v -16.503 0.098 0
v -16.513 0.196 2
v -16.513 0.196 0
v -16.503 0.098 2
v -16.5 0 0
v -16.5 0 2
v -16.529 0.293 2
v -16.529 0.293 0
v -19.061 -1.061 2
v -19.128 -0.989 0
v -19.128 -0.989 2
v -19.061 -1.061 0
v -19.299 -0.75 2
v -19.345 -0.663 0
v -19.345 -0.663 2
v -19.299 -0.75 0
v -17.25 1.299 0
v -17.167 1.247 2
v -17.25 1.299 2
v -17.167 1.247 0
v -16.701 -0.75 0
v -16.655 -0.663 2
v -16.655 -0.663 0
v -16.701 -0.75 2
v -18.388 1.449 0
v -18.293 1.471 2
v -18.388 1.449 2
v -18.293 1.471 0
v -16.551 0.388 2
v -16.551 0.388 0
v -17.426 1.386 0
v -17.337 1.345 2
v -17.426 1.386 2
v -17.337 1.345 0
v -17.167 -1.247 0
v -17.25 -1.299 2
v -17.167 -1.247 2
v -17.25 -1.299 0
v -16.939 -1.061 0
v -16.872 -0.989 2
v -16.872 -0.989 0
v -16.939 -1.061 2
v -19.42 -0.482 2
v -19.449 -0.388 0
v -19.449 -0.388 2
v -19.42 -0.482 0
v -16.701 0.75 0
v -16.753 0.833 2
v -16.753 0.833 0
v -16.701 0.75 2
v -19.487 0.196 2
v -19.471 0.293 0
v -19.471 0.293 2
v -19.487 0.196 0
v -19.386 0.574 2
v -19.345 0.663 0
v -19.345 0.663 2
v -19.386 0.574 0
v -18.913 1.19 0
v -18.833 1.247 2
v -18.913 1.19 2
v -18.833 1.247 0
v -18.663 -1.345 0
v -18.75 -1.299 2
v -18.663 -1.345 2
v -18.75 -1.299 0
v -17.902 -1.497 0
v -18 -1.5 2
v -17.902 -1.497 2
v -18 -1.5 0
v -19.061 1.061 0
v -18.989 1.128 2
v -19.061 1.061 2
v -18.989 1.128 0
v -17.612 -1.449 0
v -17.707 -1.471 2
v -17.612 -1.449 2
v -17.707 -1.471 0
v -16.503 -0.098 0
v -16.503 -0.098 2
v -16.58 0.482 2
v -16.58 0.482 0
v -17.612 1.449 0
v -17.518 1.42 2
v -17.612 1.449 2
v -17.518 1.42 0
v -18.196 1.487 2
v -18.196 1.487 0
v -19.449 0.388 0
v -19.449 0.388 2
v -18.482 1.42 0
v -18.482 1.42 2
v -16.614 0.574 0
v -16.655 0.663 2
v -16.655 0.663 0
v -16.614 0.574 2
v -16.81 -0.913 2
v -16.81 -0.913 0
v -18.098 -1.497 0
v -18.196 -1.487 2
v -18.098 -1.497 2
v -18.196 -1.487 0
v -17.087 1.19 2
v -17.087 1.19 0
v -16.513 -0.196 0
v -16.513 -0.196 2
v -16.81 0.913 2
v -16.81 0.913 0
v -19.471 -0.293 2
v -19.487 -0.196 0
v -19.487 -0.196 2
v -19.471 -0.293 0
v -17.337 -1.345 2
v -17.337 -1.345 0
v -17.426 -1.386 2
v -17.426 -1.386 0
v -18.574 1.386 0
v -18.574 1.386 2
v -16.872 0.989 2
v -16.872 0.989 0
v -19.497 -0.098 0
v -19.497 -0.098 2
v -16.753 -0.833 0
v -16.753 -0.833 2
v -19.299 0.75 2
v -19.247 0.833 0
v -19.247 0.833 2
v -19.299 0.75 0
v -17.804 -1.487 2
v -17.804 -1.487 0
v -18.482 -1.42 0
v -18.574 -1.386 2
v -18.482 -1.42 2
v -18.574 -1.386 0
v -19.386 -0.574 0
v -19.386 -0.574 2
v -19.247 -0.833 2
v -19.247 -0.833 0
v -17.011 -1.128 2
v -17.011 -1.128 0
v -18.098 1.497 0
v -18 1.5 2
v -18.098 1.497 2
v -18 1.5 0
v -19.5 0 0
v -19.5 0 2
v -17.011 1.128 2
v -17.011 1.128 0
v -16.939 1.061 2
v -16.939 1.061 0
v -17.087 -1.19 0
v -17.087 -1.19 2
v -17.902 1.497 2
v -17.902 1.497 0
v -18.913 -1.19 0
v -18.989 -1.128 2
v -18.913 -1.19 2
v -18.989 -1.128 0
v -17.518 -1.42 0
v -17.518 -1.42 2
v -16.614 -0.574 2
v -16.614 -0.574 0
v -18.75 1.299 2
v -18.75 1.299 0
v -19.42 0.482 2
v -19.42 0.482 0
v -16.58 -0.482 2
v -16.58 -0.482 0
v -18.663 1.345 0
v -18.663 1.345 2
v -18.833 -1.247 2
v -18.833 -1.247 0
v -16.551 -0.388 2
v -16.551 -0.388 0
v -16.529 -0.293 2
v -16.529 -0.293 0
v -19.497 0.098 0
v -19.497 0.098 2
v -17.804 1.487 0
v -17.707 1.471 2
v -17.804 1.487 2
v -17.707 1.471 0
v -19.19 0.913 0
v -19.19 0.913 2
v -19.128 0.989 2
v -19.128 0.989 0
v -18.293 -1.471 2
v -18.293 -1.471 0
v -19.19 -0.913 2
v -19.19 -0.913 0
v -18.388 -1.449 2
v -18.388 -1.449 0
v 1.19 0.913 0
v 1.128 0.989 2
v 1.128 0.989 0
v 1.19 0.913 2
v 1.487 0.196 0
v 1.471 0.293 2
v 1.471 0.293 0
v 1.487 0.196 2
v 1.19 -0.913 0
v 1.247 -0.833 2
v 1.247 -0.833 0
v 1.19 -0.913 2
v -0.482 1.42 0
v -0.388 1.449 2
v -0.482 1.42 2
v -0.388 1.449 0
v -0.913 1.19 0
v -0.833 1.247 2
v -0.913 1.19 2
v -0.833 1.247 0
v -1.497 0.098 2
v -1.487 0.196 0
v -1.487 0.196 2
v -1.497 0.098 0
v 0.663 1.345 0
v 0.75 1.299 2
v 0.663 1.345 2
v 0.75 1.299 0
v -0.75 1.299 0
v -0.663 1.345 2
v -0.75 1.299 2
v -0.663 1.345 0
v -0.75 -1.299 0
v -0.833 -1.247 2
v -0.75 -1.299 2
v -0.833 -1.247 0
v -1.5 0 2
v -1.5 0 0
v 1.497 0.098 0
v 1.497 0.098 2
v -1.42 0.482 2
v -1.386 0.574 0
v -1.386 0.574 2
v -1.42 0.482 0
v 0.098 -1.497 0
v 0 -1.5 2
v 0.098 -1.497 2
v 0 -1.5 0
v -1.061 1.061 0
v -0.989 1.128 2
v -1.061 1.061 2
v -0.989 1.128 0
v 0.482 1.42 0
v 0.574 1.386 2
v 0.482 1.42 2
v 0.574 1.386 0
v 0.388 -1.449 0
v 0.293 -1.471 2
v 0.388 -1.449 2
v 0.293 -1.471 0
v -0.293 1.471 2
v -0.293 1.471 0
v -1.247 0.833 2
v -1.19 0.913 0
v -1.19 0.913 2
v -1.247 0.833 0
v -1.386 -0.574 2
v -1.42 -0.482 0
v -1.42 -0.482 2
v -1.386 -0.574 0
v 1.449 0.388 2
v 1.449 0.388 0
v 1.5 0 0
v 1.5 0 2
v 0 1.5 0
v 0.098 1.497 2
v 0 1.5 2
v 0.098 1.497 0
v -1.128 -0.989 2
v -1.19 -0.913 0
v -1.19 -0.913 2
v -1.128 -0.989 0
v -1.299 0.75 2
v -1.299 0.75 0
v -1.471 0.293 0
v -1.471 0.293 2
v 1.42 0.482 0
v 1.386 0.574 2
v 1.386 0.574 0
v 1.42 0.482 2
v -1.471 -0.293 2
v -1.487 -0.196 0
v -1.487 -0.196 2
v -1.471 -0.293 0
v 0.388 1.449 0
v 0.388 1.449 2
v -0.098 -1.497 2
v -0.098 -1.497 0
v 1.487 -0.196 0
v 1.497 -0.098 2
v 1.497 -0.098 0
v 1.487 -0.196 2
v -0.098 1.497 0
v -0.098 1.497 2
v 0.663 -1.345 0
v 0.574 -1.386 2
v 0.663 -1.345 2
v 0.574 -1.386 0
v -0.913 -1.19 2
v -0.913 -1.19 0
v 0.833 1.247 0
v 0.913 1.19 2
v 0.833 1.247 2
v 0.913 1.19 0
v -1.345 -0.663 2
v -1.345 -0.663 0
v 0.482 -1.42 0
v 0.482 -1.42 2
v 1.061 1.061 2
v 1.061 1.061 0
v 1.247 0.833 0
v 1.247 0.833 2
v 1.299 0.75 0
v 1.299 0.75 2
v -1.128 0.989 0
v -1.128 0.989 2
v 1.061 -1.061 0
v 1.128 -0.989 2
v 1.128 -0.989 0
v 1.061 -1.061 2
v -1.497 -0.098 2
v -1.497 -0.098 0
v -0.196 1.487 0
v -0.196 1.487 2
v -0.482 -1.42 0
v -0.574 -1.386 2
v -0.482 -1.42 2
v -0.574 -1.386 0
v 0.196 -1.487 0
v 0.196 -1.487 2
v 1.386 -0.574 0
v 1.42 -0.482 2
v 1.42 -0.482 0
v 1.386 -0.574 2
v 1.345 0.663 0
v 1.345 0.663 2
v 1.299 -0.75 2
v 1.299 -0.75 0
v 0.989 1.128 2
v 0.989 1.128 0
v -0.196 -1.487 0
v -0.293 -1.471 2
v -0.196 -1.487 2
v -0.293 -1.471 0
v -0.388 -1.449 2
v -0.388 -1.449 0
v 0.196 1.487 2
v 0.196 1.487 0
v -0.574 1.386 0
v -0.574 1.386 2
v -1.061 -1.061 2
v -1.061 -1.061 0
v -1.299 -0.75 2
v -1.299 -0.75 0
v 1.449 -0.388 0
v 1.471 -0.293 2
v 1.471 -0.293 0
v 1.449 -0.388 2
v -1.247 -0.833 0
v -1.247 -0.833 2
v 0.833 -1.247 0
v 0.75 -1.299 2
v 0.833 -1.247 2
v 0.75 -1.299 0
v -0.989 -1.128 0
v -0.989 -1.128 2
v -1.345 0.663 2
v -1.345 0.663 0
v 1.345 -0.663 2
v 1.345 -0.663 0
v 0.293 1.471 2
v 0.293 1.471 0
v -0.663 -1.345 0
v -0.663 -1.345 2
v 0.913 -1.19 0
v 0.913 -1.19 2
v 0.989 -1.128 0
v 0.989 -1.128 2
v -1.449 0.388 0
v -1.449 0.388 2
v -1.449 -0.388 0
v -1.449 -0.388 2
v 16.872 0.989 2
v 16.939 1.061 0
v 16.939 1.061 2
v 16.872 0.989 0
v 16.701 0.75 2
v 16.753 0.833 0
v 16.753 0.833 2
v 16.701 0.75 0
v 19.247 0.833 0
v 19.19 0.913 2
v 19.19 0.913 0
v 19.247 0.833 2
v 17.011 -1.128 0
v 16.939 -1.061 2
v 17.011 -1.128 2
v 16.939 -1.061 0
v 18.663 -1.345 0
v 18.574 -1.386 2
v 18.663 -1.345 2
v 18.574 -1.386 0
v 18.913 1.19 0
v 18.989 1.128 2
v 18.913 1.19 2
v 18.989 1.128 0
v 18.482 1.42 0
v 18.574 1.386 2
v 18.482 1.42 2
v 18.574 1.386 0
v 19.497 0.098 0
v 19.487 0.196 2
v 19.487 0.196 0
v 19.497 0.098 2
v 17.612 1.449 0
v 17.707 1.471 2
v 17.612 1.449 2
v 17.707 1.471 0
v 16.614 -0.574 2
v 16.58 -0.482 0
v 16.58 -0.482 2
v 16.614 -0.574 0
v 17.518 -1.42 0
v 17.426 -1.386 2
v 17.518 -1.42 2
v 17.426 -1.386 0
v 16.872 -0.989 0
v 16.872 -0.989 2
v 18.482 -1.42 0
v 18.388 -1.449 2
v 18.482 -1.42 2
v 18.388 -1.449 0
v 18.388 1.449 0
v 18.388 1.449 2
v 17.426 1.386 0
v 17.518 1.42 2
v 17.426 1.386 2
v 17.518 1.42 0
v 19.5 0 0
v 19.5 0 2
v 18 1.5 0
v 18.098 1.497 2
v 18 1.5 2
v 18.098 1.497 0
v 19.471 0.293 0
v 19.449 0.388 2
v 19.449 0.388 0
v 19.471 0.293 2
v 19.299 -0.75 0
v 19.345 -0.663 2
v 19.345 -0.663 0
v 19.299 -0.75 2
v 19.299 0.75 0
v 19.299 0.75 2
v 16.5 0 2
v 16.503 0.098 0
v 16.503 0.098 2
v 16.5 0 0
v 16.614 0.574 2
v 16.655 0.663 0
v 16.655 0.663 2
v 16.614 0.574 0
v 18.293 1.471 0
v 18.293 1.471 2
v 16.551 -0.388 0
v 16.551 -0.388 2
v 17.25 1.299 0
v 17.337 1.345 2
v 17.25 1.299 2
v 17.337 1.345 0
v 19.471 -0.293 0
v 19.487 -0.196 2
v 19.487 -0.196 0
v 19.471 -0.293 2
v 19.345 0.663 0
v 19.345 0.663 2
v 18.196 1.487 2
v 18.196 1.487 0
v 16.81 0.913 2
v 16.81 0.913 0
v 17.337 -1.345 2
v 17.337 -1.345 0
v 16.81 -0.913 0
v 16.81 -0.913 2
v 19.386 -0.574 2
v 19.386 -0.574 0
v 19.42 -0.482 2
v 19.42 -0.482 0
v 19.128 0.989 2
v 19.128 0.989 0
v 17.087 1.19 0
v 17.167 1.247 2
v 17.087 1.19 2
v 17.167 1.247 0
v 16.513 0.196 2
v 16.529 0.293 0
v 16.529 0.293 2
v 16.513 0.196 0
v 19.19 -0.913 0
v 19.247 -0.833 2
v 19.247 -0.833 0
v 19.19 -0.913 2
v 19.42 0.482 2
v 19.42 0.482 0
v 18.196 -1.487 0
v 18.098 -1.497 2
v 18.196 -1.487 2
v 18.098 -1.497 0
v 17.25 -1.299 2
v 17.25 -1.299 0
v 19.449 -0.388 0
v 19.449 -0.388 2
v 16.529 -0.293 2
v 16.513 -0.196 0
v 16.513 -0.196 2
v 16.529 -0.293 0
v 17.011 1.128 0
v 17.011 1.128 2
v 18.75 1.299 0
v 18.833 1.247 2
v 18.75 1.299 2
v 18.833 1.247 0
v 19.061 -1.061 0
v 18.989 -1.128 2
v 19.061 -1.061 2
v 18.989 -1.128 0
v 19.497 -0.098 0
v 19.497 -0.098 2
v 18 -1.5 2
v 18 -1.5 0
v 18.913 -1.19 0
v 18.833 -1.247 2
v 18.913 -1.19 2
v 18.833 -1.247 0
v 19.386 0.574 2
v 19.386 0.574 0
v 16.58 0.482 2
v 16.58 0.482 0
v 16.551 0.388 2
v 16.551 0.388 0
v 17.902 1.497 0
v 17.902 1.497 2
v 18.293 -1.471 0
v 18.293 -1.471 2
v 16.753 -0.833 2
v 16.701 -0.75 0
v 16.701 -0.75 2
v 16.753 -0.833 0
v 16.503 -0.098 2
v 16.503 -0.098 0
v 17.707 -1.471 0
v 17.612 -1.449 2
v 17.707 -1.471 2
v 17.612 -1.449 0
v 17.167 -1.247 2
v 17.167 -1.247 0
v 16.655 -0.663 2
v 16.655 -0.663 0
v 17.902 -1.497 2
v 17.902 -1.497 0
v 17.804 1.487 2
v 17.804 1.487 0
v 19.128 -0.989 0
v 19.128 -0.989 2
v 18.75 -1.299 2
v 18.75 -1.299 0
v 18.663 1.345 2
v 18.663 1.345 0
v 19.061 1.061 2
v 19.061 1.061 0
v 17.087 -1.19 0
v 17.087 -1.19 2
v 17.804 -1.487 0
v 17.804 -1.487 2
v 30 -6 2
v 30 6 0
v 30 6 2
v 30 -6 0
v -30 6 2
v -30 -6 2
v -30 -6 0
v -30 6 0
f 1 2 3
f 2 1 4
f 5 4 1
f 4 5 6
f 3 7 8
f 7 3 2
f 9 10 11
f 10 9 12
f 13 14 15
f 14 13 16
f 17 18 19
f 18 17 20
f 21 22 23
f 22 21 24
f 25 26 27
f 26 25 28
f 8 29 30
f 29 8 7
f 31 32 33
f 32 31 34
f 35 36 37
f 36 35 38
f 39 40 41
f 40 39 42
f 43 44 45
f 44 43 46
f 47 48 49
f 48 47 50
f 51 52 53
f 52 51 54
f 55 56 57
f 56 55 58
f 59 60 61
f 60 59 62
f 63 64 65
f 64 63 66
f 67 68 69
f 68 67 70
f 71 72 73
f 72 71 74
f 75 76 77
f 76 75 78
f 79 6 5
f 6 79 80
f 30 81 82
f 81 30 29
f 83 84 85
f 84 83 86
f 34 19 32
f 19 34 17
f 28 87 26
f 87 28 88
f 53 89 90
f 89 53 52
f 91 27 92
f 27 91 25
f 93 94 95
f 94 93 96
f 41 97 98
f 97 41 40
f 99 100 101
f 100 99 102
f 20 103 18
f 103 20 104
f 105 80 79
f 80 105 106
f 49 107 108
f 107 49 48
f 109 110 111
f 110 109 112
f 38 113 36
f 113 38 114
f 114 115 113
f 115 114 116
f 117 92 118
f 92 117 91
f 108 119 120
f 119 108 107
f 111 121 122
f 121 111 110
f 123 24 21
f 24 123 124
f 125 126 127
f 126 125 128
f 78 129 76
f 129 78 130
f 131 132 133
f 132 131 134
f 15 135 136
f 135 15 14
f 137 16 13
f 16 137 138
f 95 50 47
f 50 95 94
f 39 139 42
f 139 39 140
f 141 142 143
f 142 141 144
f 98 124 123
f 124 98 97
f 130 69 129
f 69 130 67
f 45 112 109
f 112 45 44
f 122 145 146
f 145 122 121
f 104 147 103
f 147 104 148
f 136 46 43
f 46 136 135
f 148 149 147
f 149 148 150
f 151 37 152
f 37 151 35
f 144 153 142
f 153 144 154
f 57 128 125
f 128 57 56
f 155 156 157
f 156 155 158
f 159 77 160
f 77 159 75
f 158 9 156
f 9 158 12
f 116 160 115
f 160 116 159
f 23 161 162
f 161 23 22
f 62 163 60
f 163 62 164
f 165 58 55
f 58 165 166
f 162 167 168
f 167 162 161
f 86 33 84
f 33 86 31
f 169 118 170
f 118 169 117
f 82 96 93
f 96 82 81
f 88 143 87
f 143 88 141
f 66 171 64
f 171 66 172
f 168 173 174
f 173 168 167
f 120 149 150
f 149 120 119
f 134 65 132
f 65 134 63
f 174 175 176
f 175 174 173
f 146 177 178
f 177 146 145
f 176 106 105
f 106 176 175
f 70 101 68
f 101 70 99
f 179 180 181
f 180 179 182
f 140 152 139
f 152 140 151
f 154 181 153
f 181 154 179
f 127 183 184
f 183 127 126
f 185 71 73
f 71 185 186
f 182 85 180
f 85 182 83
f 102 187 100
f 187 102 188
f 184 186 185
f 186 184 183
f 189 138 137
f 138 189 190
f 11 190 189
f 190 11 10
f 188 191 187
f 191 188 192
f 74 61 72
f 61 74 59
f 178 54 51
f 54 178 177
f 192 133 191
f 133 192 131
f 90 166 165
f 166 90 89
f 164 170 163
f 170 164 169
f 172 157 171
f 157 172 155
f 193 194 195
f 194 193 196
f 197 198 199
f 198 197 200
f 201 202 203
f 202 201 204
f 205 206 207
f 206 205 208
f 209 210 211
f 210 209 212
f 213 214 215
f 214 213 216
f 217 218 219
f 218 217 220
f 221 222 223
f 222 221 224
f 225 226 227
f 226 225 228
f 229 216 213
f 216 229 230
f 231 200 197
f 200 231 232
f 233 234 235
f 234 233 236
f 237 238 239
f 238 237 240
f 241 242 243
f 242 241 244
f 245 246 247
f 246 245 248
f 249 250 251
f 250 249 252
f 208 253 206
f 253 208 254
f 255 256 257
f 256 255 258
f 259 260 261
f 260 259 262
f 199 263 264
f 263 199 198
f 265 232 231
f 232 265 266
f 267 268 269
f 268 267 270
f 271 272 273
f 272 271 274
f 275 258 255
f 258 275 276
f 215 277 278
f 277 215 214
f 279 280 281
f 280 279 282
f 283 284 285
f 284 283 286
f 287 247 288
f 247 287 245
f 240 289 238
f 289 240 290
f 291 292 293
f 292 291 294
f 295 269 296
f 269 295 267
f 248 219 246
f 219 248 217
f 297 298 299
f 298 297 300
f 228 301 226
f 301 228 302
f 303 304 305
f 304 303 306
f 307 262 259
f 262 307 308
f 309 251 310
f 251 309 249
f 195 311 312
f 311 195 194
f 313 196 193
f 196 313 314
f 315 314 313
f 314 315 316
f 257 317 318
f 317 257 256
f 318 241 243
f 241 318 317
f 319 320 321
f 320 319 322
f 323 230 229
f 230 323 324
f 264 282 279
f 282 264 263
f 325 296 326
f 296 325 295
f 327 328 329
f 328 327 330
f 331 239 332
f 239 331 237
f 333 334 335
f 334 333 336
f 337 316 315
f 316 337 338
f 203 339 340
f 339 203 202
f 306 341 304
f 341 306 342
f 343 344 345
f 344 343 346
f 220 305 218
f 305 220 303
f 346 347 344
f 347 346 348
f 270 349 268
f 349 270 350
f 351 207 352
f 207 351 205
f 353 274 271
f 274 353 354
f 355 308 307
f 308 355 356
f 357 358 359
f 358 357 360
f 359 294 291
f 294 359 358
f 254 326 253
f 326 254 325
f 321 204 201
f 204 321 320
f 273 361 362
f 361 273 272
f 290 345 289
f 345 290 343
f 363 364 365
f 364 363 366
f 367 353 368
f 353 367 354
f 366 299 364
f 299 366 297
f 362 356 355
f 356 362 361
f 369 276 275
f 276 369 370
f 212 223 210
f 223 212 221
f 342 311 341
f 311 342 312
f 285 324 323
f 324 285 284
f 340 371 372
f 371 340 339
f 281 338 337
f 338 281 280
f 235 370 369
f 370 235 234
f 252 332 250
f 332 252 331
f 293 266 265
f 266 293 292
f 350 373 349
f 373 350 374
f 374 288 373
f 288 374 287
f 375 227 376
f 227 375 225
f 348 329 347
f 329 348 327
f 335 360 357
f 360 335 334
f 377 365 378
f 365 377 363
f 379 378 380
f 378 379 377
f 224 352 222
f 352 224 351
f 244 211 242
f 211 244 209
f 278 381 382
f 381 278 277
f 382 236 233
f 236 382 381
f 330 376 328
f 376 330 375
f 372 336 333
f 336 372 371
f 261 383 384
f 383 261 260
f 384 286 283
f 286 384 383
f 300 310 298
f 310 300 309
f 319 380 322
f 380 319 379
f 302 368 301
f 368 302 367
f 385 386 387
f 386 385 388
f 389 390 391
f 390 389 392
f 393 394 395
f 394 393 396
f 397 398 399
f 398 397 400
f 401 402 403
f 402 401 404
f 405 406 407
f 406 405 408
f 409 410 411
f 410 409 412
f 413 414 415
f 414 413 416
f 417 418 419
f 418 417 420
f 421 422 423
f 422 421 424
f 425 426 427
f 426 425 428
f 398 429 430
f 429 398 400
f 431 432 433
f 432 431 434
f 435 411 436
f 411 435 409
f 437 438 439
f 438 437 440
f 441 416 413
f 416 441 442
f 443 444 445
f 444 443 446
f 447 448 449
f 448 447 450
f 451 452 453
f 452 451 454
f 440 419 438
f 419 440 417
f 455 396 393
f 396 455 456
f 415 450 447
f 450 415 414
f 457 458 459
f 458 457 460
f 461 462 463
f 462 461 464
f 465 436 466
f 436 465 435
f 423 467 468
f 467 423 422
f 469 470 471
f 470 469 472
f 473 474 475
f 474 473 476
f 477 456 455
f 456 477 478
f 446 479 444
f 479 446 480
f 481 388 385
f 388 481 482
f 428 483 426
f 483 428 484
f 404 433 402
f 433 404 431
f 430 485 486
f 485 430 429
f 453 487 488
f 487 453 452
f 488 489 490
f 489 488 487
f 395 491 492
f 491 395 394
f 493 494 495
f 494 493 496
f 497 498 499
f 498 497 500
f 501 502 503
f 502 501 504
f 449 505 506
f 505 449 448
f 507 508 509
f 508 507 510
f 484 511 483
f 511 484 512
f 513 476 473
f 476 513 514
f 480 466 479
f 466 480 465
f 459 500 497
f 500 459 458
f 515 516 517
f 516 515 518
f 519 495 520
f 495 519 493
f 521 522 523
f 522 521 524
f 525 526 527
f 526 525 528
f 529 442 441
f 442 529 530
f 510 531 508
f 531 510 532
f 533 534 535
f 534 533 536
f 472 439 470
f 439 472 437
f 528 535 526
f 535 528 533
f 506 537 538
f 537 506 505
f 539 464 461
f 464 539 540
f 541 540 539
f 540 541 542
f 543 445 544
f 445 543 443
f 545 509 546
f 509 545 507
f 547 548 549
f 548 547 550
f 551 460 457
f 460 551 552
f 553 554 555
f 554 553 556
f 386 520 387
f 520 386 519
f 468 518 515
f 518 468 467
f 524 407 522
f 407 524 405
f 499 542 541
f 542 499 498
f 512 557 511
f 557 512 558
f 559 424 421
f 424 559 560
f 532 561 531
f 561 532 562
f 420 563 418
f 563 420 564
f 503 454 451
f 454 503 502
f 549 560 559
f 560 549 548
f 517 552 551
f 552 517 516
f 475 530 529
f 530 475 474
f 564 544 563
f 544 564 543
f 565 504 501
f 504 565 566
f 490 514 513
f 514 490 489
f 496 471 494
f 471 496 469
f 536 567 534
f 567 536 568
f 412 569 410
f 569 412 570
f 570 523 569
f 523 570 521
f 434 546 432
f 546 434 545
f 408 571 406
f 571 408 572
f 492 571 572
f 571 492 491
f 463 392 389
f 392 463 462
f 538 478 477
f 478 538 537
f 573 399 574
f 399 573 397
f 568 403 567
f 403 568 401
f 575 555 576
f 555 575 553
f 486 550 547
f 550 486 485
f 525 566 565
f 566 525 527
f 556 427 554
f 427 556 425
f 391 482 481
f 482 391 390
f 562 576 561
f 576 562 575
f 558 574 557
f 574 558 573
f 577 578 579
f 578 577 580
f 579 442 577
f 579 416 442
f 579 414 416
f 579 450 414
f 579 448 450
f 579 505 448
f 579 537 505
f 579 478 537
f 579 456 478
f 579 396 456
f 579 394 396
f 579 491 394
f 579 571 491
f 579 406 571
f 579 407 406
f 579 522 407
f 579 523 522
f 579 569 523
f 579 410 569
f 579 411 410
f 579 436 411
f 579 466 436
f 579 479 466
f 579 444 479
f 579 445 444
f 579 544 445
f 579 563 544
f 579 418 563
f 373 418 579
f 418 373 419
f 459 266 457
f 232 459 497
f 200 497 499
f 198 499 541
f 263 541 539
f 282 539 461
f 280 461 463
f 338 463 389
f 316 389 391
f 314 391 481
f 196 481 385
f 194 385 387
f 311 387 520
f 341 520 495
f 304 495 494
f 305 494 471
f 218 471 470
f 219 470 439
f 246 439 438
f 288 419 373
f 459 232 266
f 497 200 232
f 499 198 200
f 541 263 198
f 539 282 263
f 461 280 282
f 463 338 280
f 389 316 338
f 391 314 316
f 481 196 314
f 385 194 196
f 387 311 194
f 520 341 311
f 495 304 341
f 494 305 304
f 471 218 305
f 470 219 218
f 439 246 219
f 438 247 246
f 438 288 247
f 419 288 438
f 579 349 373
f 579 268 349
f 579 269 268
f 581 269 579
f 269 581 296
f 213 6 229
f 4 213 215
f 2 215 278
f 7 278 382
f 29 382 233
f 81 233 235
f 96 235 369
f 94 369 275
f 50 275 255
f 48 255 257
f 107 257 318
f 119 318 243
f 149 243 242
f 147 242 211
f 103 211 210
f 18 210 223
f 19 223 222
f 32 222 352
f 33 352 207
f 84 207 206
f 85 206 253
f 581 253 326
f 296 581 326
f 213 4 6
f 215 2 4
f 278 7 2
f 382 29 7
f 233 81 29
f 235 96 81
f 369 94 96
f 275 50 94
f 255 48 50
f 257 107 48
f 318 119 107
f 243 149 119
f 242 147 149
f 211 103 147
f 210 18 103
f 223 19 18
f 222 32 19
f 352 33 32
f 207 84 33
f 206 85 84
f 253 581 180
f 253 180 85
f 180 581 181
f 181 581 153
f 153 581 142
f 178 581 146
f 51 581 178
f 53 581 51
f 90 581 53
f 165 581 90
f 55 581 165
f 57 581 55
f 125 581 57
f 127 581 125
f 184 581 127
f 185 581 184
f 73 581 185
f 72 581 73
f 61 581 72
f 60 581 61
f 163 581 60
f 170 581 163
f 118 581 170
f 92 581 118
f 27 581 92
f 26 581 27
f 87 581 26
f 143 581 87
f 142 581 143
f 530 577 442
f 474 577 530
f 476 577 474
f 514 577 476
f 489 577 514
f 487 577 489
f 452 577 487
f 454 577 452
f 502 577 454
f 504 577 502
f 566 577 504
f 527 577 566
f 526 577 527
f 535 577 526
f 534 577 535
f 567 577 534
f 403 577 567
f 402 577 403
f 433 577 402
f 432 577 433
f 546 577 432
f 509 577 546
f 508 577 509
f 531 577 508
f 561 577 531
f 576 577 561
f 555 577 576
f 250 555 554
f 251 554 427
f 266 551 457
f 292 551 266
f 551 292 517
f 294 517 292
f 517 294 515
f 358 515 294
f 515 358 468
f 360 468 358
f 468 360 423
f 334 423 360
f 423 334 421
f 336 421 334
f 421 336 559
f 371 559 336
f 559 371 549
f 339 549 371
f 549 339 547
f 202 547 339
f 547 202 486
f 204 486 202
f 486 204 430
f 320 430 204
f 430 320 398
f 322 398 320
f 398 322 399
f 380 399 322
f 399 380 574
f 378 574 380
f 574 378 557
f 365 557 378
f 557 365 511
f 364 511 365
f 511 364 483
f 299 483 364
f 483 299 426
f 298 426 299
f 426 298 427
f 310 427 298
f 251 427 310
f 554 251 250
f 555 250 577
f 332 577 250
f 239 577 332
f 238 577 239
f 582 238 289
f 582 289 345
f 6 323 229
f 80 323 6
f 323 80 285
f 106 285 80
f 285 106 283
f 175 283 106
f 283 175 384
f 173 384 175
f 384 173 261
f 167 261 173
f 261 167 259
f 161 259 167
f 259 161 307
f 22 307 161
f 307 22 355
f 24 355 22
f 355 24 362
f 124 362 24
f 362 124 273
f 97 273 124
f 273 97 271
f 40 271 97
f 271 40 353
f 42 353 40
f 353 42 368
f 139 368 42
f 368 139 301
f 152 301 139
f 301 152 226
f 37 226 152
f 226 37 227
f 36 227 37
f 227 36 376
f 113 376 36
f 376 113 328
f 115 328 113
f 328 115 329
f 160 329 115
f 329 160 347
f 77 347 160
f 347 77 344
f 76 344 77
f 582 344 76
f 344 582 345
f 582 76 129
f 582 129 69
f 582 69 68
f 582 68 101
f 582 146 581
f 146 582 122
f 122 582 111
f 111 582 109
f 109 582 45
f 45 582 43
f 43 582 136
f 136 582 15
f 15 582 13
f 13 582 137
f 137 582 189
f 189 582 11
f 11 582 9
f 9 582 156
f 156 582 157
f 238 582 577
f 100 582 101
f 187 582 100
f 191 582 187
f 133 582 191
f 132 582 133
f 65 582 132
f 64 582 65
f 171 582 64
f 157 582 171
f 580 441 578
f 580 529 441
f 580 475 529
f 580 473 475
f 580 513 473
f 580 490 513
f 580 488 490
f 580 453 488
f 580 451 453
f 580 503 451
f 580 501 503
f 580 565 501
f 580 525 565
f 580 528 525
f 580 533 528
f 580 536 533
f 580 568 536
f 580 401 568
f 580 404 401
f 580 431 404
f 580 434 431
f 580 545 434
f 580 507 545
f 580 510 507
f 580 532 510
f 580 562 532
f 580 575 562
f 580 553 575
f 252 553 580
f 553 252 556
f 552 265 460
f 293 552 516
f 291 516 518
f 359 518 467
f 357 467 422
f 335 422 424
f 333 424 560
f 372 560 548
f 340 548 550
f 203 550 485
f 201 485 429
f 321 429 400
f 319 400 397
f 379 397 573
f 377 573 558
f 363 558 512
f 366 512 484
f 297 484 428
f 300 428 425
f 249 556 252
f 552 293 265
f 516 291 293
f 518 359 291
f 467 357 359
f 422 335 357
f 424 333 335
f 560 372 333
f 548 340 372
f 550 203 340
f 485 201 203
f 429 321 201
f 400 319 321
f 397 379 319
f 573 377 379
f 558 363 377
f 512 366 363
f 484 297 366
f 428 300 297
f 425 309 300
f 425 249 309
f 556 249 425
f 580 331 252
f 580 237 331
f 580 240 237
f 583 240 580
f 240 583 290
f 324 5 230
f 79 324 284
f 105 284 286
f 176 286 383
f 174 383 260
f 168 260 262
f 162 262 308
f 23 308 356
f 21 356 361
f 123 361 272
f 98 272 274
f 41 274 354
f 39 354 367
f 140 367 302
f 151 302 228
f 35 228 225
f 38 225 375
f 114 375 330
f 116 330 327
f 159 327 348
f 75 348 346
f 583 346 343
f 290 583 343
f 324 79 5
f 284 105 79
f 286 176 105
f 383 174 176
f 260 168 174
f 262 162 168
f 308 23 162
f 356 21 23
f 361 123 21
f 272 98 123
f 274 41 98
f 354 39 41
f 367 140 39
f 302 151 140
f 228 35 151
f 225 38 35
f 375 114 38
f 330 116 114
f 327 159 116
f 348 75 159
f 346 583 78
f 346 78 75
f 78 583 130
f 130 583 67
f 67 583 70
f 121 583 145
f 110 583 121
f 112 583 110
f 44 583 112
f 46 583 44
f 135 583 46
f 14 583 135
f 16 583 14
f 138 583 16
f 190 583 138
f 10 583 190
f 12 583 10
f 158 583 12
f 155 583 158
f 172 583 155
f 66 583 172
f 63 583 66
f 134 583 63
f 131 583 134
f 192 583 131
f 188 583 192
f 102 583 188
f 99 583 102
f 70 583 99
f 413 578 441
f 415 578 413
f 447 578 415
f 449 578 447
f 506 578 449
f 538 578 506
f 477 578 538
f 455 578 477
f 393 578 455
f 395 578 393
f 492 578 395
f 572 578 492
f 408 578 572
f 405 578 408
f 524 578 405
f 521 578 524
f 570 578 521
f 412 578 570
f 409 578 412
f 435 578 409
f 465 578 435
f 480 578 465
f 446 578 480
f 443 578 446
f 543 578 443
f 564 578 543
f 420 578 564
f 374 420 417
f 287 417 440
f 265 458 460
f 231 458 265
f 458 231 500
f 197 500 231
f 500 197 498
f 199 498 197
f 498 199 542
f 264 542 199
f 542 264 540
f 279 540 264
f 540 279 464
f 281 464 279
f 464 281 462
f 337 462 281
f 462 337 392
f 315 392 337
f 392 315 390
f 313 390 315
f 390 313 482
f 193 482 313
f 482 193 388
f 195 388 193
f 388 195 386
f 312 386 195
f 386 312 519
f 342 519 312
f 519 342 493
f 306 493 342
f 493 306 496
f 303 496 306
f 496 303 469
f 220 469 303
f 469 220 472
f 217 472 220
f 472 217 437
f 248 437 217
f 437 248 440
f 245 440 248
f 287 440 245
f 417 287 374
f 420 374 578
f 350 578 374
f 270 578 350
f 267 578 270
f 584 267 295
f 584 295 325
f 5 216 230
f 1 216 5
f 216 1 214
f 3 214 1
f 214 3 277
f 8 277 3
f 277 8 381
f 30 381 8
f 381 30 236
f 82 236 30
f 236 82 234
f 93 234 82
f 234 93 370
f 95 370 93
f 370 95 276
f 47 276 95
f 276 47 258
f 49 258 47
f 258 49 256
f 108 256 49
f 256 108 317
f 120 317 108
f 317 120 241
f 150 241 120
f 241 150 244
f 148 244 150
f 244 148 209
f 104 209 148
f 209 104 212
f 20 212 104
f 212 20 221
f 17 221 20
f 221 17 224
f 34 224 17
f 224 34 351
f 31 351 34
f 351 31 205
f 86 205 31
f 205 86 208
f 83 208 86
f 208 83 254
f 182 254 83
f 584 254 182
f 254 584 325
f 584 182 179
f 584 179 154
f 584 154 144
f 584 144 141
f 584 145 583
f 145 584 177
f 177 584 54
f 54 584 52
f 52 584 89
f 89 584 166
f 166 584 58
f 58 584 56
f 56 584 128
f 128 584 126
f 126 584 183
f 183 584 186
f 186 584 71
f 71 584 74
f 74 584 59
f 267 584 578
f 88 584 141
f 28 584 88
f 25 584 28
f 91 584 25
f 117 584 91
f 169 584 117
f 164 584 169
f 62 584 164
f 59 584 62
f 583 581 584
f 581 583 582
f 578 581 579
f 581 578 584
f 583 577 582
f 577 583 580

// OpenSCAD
// Auto-generated from tests/data/feature_fixtures_manifest.json
// fixture: plate_long_aspect_linear
// fixture_type: plate
// description: High-aspect-ratio plate with a three-hole linear pattern.
$fn = 96;

plate_size = [60.000000, 12.000000, 2.000000];
plate_origin = [-30.000000, -6.000000, 0.000000];

module through_hole(center, diameter, height) {
  translate(center) cylinder(d=diameter, h=height, center=false);
}

module through_slot(start, end, width, height) {
  hull() {
    through_hole(start, width, height);
    through_hole(end, width, height);
  }
}

module counterbore_hole(center, through_d, bore_d, bore_depth, plate_thickness) {
  translate([center[0], center[1], -0.1])
    cylinder(d=through_d, h=plate_thickness + 0.2, center=false);
  translate([center[0], center[1], plate_thickness - bore_depth])
    cylinder(d=bore_d, h=bore_depth + 0.1, center=false);
}

difference() {
  translate(plate_origin) cube(plate_size);
  for (i = [0 : 2]) {
    through_hole([-18.000000, 0.000000, -0.100000] + i * [18.000000, 0.000000, 0.000000], 3.000000, 2.200000);  // linear_pattern_0
  }
}
